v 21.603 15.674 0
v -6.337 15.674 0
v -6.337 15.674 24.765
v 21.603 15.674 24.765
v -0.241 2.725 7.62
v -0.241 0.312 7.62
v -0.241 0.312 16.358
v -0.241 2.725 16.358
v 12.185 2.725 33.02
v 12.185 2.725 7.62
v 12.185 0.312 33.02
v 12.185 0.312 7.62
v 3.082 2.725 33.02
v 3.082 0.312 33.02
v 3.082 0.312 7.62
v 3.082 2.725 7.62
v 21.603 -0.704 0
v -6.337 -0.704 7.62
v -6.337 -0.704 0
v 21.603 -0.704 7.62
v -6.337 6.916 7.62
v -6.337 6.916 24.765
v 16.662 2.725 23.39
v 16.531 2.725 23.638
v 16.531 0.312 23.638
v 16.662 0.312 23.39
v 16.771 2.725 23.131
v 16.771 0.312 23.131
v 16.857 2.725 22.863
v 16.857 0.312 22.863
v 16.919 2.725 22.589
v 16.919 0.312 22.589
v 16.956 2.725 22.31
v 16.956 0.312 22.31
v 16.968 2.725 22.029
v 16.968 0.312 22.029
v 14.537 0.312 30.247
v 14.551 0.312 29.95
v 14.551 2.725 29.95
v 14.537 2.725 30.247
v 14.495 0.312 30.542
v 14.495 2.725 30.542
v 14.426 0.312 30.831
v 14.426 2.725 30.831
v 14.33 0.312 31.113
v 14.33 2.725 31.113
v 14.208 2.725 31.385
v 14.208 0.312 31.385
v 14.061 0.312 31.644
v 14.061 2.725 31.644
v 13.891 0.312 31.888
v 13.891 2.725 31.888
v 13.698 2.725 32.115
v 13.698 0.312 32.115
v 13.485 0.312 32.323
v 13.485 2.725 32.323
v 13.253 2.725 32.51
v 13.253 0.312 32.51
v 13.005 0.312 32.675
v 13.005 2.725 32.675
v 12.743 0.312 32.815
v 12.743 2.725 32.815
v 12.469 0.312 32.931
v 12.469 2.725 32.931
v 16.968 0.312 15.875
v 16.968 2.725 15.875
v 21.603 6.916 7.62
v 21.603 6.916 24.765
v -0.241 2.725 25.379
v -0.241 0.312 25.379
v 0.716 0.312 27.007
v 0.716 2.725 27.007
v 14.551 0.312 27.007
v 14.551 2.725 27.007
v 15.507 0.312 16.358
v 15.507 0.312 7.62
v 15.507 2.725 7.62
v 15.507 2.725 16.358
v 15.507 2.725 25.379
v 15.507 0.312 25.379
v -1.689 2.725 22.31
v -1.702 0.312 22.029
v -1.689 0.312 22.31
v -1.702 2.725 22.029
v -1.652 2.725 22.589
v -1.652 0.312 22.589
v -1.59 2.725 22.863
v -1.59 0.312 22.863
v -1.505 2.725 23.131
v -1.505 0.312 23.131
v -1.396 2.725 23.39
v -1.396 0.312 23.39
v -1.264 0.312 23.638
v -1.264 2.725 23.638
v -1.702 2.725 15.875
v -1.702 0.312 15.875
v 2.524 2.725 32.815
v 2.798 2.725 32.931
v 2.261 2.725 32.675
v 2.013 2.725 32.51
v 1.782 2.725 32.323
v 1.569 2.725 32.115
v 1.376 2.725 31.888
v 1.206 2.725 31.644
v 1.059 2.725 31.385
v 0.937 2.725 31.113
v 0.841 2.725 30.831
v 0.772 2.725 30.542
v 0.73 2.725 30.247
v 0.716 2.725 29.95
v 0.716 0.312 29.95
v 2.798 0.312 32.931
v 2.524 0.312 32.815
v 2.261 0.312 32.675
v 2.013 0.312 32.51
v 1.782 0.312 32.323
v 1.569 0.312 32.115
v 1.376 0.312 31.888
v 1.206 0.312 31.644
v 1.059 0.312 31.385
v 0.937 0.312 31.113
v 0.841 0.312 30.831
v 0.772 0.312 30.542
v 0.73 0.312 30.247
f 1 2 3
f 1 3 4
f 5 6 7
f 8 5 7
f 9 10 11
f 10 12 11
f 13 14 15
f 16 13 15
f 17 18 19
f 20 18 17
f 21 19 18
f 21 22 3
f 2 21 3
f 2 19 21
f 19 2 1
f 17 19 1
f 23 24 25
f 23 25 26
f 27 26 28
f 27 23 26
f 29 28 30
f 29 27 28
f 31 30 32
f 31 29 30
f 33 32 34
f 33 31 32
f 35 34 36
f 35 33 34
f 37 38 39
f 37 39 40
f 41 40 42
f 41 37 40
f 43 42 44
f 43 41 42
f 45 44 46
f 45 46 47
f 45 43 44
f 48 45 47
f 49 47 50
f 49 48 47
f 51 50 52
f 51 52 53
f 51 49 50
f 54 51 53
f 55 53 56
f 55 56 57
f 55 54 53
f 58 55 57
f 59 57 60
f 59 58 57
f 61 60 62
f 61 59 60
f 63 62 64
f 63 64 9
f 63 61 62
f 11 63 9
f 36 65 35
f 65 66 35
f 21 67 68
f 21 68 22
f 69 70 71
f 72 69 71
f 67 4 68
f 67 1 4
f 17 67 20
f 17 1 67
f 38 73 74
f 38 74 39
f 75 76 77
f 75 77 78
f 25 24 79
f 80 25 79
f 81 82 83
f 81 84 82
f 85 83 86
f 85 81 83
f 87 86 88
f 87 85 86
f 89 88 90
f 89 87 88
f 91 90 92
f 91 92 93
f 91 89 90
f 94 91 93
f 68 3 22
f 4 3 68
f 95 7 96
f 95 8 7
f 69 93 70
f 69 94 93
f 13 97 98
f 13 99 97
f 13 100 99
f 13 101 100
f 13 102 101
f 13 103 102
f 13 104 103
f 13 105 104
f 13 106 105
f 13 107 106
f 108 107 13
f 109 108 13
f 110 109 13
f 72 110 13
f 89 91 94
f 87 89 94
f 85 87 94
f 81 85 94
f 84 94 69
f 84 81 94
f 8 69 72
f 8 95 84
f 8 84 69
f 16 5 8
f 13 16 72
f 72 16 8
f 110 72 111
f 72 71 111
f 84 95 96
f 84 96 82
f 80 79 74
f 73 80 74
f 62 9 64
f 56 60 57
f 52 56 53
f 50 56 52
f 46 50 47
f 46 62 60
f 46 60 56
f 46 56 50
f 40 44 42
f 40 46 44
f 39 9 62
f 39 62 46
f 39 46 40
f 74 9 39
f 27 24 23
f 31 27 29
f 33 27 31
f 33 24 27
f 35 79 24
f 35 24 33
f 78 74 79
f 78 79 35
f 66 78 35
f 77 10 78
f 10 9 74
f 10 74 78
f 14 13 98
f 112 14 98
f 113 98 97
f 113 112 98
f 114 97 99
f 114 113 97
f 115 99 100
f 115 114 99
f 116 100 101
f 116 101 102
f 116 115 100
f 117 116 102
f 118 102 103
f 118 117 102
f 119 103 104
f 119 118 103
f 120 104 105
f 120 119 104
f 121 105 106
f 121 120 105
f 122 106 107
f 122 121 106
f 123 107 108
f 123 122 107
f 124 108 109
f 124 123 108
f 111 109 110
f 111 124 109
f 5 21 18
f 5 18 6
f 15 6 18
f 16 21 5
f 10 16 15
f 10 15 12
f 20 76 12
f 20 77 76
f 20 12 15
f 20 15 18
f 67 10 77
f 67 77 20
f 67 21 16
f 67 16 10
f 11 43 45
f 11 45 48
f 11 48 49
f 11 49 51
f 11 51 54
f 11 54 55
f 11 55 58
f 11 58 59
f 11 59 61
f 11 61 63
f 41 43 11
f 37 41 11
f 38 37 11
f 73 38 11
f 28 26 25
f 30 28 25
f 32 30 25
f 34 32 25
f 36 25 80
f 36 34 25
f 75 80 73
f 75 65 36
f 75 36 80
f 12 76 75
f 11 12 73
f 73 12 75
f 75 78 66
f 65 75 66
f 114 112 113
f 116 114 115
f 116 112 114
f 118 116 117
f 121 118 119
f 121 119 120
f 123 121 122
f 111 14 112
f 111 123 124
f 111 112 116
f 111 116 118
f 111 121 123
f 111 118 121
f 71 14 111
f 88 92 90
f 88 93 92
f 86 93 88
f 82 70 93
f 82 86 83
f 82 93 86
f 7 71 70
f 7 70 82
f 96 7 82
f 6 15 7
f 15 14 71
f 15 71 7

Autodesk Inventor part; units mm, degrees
ref_plane "YZ Plane" through (0, 0, 0) normal (1, 0, 0) x (0, 1, 0)
ref_plane "XZ Plane" through (0, 0, 0) normal (0, 1, 0) x (-1, 0, 0)
ref_plane "XY Plane" through (0, 0, 0) normal (0, 0, 1) x (1, 0, 0)
sketch "Sketch1" plane through (0, 0, 0) normal (0, 0, 1) x (1, 0, 0)
  line L0 (-6.3366, 6.9163) -> (21.6034, 6.9163)
  line L1 (21.6034, 6.9163) -> (21.6034, -8.3237)
  line L2 (21.6034, -8.3237) -> (-6.3366, -8.3237)
  line L3 (-6.3366, -8.3237) -> (-6.3366, 6.9163)
  point P0 (0, 0)
  dimension "d0" = 27.94
  dimension "d1" = 15.24
extrude "Extrusion1" add sketch "Sketch1" along normal blind 7.62
sketch "Sketch2" plane through (0, 0, 7.62) normal (0, 0, 1) x (1, 0, 0)
  line L0 (-6.3366, 6.9163) -> (-6.3366, -8.3237) projected
  line L1 (21.6034, -8.3237) -> (21.6034, 6.9163) projected
  line L2 (21.6034, 0.3123) -> (21.6034, 2.7253)
  line L3 (-6.3366, 2.7253) -> (-6.3366, 0.3123)
  line L4 (21.6034, 6.9163) -> (-6.3366, 6.9163) projected
  line L5 (-6.3366, -8.3237) -> (21.6034, -8.3237) projected
  line L6 (0.9631, 2.7253) -> (-0.2406, 2.7253)
  line L7 (-0.2406, 0.3123) -> (0.9631, 0.3123)
  line L8 (-0.2406, 0.3123) -> (-0.2406, 2.7253)
  line L9 (-0.2406, 0.3123) -> (3.0821, 0.3123)
  line L10 (3.0821, 0.3123) -> (3.0821, 2.7253)
  line L11 (3.0821, 2.7253) -> (-0.2406, 2.7253)
  line L12 (-0.2406, 2.7253) -> (-0.2406, 0.3123)
  line L13 (14.3038, 2.7253) -> (15.5074, 2.7253)
  line L14 (15.5074, 0.3123) -> (14.3038, 0.3123)
  line L15 (15.5074, 0.3123) -> (15.5074, 2.7253)
  line L16 (15.5074, 0.3123) -> (12.1847, 0.3123)
  line L17 (12.1847, 0.3123) -> (12.1847, 2.7253)
  line L18 (12.1847, 2.7253) -> (15.5074, 2.7253)
  line L19 (15.5074, 2.7253) -> (15.5074, 0.3123)
  line L20 (-6.3366, -0.7037) -> (21.6034, -0.7037)
  line L21 (-6.3366, 2.7253) -> (21.6034, 2.7253)
  line L22 (21.6034, 2.7253) -> (21.6034, 0.3123)
  line L23 (21.6034, 0.3123) -> (-6.3366, 0.3123)
  line L24 (-6.3366, 0.3123) -> (-6.3366, 2.7253)
  point P0 (0, 0)
  point P1 (-0.2406, 1.5188)
  point P2 (15.2669, 0)
  point P3 (15.5074, 1.5188)
  dimension "d6" = 6.096
extrude "Extrusion2" add sketch "Sketch2" along normal blind 8.7376 contours L6 L11 L10 L9 L7 L8 | L15 L14 L16 L17 L18 L13
sketch "Sketch3" plane through (-0.2406, 2.7253, 7.62) normal (0, 1, 0) x (1, 0, 0)
  line L0 (3.3227, -8.7376) -> (0, -8.7376) projected
  line L1 (3.3227, -8.7376) -> (0, -8.7376)
  line L2 (-6.096, 7.62) -> (21.844, 7.62) projected
  line L3 (3.3227, -11.3552) -> (3.3227, -8.7376)
  line L4 (12.4253, -8.7376) -> (15.748, -8.7376)
  line L5 (12.4253, -8.7376) -> (15.748, -8.7376)
  line L6 (12.4253, -11.3552) -> (12.4253, -8.7376)
  line L7 (15.748, -8.7376) -> (17.2091, -8.255)
  line L8 (17.2091, -8.255) -> (17.2091, -15.2732)
  line L9 (17.2091, -15.2732) -> (14.9854, -19.057)
  line L10 (14.9854, -19.057) -> (12.4253, -19.057)
  line L11 (12.4253, -19.057) -> (12.4253, -8.7376)
  line L12 (7.874, 7.62) -> (7.874, -24.8322)
  line L13 (3.3227, -8.7376) -> (0, -8.7376)
  line L14 (3.3227, -8.7376) -> (0, -8.7376)
  line L15 (3.3227, -11.3552) -> (3.3227, -8.7376)
  line L16 (0, -8.7376) -> (-1.4611, -8.255)
  line L17 (-1.4611, -8.255) -> (-1.4611, -15.2732)
  line L18 (-1.4611, -15.2732) -> (0.7626, -19.057)
  line L19 (0.7626, -19.057) -> (3.3227, -19.057)
  line L20 (3.3227, -19.057) -> (3.3227, -8.7376)
  point P0 (0.2406, 7.62)
extrude "Extrusion4" add sketch "Sketch2" along normal blind 25.4 contours L6 L11 L10 L9 L7 L8 | L15 L14 L16 L17 L18 L13
sketch "Sketch4" plane through (-6.3366, 6.9163, 0) normal (0, 1, 0) x (1, 0, 0)
  point P0 (6.3366, 0)
sketch "Sketch5" plane through (0, 0, 7.62) normal (0, 0, 1) x (1, 0, 0)
  line L0 (21.6034, 6.9163) -> (-6.3366, 6.9163) projected
  line L1 (-6.3366, 15.6735) -> (21.6034, 15.6735)
  line L2 (21.6034, 15.6735) -> (21.6034, 6.9163)
  line L3 (21.6034, 6.9163) -> (-6.3366, 6.9163)
  line L4 (-6.3366, 6.9163) -> (-6.3366, 15.6735)
  point P0 (0, 0)
extrude "Extrusion5" add sketch "Sketch5" along normal blind 17.145 and the other way blind 7.62
extrude "Extrusion6" cut sketch "Sketch2" against normal blind 25.4 contours L20 L1 L5 L0
extrude "Extrusion7" add sketch "Sketch2" along normal blind 4.7625 contours L21 L8 L23 L0 | L1 L23 L15 L21 | L21 L17 L23 L10
extrude "Extrusion8" add sketch "Sketch3" against normal up to surface (2.413 mm away)
sketch "Sketch6" plane through (-6.3366, 0.3123, 7.62) normal (0, -1, 0) x (1, 0, 0)
  line L0 (27.94, 0) -> (27.94, 4.7625) projected
  line L1 (21.844, 4.7625) -> (21.844, 8.7376) projected
  line L2 (27.94, 0) -> (21.844, 0)
  line L3 (21.844, 0) -> (21.844, 4.7625)
  line L4 (21.844, 4.7625) -> (27.94, 4.7625)
  line L5 (27.94, 4.7625) -> (27.94, 0)
  line L6 (18.5213, 4.7625) -> (18.5213, 25.4) projected
  line L7 (18.5213, 4.7625) -> (9.4187, 4.7625)
  line L8 (9.4187, 4.7625) -> (9.4187, 0)
  line L9 (9.4187, 0) -> (18.5213, 0)
  line L10 (18.5213, 0) -> (18.5213, 4.7625)
  line L11 (6.096, 4.7625) -> (6.096, 8.7376) projected
  line L12 (0, 0) -> (0, 4.7625) projected
  line L13 (6.096, 4.7625) -> (0, 4.7625)
  line L14 (0, 4.7625) -> (0, 0)
  line L15 (0, 0) -> (6.096, 0)
  line L16 (6.096, 0) -> (6.096, 4.7625)
  point P0 (6.3366, -7.62)
  point P1 (18.5213, 19.057)
extrude "Extrusion9" cut sketch "Sketch6" against normal up to surface (6.604 mm away)
sketch "Sketch7" plane through (12.1847, 0.3123, 7.62) normal (0, -1, 0) x (1, 0, 0)
  line L0 (3.3227, 17.7594) -> (4.7838, 15.2732) projected
  line L1 (3.3227, 17.7594) -> (2.3659, 19.3874)
  line L2 (2.3659, 19.3874) -> (2.3659, 25.4)
  line L3 (3.3227, 25.4) -> (0, 25.4) projected
  line L4 (3.3227, 17.7594) -> (3.3227, 25.4) projected
  line L5 (2.3659, 25.4) -> (3.3227, 25.4)
  line L6 (3.3227, 25.4) -> (3.3227, 17.7594)
  line L7 (-18.5213, -7.62) -> (9.4187, -7.62) projected
  line L8 (-12.4253, 17.7594) -> (-11.4685, 19.3874)
  line L9 (-11.4685, 19.3874) -> (-11.4685, 25.4)
  line L10 (-12.4253, 17.7594) -> (-12.4253, 25.4)
  line L11 (-11.4685, 25.4) -> (-12.4253, 25.4)
  line L12 (-12.4253, 25.4) -> (-12.4253, 17.7594)
  point P0 (-12.1847, -7.62)
extrude "Extrusion10" cut sketch "Sketch7" against normal up to surface (6.604 mm away)
fillet "Fillet1" radius 3.175 4 edges at (0.7162, 1.5188, 33.02) (14.5507, 1.5188, 33.02) (16.9686, 1.5188, 22.8932) (-1.7017, 1.5188, 22.8932)
properties part number "Attachment1"
